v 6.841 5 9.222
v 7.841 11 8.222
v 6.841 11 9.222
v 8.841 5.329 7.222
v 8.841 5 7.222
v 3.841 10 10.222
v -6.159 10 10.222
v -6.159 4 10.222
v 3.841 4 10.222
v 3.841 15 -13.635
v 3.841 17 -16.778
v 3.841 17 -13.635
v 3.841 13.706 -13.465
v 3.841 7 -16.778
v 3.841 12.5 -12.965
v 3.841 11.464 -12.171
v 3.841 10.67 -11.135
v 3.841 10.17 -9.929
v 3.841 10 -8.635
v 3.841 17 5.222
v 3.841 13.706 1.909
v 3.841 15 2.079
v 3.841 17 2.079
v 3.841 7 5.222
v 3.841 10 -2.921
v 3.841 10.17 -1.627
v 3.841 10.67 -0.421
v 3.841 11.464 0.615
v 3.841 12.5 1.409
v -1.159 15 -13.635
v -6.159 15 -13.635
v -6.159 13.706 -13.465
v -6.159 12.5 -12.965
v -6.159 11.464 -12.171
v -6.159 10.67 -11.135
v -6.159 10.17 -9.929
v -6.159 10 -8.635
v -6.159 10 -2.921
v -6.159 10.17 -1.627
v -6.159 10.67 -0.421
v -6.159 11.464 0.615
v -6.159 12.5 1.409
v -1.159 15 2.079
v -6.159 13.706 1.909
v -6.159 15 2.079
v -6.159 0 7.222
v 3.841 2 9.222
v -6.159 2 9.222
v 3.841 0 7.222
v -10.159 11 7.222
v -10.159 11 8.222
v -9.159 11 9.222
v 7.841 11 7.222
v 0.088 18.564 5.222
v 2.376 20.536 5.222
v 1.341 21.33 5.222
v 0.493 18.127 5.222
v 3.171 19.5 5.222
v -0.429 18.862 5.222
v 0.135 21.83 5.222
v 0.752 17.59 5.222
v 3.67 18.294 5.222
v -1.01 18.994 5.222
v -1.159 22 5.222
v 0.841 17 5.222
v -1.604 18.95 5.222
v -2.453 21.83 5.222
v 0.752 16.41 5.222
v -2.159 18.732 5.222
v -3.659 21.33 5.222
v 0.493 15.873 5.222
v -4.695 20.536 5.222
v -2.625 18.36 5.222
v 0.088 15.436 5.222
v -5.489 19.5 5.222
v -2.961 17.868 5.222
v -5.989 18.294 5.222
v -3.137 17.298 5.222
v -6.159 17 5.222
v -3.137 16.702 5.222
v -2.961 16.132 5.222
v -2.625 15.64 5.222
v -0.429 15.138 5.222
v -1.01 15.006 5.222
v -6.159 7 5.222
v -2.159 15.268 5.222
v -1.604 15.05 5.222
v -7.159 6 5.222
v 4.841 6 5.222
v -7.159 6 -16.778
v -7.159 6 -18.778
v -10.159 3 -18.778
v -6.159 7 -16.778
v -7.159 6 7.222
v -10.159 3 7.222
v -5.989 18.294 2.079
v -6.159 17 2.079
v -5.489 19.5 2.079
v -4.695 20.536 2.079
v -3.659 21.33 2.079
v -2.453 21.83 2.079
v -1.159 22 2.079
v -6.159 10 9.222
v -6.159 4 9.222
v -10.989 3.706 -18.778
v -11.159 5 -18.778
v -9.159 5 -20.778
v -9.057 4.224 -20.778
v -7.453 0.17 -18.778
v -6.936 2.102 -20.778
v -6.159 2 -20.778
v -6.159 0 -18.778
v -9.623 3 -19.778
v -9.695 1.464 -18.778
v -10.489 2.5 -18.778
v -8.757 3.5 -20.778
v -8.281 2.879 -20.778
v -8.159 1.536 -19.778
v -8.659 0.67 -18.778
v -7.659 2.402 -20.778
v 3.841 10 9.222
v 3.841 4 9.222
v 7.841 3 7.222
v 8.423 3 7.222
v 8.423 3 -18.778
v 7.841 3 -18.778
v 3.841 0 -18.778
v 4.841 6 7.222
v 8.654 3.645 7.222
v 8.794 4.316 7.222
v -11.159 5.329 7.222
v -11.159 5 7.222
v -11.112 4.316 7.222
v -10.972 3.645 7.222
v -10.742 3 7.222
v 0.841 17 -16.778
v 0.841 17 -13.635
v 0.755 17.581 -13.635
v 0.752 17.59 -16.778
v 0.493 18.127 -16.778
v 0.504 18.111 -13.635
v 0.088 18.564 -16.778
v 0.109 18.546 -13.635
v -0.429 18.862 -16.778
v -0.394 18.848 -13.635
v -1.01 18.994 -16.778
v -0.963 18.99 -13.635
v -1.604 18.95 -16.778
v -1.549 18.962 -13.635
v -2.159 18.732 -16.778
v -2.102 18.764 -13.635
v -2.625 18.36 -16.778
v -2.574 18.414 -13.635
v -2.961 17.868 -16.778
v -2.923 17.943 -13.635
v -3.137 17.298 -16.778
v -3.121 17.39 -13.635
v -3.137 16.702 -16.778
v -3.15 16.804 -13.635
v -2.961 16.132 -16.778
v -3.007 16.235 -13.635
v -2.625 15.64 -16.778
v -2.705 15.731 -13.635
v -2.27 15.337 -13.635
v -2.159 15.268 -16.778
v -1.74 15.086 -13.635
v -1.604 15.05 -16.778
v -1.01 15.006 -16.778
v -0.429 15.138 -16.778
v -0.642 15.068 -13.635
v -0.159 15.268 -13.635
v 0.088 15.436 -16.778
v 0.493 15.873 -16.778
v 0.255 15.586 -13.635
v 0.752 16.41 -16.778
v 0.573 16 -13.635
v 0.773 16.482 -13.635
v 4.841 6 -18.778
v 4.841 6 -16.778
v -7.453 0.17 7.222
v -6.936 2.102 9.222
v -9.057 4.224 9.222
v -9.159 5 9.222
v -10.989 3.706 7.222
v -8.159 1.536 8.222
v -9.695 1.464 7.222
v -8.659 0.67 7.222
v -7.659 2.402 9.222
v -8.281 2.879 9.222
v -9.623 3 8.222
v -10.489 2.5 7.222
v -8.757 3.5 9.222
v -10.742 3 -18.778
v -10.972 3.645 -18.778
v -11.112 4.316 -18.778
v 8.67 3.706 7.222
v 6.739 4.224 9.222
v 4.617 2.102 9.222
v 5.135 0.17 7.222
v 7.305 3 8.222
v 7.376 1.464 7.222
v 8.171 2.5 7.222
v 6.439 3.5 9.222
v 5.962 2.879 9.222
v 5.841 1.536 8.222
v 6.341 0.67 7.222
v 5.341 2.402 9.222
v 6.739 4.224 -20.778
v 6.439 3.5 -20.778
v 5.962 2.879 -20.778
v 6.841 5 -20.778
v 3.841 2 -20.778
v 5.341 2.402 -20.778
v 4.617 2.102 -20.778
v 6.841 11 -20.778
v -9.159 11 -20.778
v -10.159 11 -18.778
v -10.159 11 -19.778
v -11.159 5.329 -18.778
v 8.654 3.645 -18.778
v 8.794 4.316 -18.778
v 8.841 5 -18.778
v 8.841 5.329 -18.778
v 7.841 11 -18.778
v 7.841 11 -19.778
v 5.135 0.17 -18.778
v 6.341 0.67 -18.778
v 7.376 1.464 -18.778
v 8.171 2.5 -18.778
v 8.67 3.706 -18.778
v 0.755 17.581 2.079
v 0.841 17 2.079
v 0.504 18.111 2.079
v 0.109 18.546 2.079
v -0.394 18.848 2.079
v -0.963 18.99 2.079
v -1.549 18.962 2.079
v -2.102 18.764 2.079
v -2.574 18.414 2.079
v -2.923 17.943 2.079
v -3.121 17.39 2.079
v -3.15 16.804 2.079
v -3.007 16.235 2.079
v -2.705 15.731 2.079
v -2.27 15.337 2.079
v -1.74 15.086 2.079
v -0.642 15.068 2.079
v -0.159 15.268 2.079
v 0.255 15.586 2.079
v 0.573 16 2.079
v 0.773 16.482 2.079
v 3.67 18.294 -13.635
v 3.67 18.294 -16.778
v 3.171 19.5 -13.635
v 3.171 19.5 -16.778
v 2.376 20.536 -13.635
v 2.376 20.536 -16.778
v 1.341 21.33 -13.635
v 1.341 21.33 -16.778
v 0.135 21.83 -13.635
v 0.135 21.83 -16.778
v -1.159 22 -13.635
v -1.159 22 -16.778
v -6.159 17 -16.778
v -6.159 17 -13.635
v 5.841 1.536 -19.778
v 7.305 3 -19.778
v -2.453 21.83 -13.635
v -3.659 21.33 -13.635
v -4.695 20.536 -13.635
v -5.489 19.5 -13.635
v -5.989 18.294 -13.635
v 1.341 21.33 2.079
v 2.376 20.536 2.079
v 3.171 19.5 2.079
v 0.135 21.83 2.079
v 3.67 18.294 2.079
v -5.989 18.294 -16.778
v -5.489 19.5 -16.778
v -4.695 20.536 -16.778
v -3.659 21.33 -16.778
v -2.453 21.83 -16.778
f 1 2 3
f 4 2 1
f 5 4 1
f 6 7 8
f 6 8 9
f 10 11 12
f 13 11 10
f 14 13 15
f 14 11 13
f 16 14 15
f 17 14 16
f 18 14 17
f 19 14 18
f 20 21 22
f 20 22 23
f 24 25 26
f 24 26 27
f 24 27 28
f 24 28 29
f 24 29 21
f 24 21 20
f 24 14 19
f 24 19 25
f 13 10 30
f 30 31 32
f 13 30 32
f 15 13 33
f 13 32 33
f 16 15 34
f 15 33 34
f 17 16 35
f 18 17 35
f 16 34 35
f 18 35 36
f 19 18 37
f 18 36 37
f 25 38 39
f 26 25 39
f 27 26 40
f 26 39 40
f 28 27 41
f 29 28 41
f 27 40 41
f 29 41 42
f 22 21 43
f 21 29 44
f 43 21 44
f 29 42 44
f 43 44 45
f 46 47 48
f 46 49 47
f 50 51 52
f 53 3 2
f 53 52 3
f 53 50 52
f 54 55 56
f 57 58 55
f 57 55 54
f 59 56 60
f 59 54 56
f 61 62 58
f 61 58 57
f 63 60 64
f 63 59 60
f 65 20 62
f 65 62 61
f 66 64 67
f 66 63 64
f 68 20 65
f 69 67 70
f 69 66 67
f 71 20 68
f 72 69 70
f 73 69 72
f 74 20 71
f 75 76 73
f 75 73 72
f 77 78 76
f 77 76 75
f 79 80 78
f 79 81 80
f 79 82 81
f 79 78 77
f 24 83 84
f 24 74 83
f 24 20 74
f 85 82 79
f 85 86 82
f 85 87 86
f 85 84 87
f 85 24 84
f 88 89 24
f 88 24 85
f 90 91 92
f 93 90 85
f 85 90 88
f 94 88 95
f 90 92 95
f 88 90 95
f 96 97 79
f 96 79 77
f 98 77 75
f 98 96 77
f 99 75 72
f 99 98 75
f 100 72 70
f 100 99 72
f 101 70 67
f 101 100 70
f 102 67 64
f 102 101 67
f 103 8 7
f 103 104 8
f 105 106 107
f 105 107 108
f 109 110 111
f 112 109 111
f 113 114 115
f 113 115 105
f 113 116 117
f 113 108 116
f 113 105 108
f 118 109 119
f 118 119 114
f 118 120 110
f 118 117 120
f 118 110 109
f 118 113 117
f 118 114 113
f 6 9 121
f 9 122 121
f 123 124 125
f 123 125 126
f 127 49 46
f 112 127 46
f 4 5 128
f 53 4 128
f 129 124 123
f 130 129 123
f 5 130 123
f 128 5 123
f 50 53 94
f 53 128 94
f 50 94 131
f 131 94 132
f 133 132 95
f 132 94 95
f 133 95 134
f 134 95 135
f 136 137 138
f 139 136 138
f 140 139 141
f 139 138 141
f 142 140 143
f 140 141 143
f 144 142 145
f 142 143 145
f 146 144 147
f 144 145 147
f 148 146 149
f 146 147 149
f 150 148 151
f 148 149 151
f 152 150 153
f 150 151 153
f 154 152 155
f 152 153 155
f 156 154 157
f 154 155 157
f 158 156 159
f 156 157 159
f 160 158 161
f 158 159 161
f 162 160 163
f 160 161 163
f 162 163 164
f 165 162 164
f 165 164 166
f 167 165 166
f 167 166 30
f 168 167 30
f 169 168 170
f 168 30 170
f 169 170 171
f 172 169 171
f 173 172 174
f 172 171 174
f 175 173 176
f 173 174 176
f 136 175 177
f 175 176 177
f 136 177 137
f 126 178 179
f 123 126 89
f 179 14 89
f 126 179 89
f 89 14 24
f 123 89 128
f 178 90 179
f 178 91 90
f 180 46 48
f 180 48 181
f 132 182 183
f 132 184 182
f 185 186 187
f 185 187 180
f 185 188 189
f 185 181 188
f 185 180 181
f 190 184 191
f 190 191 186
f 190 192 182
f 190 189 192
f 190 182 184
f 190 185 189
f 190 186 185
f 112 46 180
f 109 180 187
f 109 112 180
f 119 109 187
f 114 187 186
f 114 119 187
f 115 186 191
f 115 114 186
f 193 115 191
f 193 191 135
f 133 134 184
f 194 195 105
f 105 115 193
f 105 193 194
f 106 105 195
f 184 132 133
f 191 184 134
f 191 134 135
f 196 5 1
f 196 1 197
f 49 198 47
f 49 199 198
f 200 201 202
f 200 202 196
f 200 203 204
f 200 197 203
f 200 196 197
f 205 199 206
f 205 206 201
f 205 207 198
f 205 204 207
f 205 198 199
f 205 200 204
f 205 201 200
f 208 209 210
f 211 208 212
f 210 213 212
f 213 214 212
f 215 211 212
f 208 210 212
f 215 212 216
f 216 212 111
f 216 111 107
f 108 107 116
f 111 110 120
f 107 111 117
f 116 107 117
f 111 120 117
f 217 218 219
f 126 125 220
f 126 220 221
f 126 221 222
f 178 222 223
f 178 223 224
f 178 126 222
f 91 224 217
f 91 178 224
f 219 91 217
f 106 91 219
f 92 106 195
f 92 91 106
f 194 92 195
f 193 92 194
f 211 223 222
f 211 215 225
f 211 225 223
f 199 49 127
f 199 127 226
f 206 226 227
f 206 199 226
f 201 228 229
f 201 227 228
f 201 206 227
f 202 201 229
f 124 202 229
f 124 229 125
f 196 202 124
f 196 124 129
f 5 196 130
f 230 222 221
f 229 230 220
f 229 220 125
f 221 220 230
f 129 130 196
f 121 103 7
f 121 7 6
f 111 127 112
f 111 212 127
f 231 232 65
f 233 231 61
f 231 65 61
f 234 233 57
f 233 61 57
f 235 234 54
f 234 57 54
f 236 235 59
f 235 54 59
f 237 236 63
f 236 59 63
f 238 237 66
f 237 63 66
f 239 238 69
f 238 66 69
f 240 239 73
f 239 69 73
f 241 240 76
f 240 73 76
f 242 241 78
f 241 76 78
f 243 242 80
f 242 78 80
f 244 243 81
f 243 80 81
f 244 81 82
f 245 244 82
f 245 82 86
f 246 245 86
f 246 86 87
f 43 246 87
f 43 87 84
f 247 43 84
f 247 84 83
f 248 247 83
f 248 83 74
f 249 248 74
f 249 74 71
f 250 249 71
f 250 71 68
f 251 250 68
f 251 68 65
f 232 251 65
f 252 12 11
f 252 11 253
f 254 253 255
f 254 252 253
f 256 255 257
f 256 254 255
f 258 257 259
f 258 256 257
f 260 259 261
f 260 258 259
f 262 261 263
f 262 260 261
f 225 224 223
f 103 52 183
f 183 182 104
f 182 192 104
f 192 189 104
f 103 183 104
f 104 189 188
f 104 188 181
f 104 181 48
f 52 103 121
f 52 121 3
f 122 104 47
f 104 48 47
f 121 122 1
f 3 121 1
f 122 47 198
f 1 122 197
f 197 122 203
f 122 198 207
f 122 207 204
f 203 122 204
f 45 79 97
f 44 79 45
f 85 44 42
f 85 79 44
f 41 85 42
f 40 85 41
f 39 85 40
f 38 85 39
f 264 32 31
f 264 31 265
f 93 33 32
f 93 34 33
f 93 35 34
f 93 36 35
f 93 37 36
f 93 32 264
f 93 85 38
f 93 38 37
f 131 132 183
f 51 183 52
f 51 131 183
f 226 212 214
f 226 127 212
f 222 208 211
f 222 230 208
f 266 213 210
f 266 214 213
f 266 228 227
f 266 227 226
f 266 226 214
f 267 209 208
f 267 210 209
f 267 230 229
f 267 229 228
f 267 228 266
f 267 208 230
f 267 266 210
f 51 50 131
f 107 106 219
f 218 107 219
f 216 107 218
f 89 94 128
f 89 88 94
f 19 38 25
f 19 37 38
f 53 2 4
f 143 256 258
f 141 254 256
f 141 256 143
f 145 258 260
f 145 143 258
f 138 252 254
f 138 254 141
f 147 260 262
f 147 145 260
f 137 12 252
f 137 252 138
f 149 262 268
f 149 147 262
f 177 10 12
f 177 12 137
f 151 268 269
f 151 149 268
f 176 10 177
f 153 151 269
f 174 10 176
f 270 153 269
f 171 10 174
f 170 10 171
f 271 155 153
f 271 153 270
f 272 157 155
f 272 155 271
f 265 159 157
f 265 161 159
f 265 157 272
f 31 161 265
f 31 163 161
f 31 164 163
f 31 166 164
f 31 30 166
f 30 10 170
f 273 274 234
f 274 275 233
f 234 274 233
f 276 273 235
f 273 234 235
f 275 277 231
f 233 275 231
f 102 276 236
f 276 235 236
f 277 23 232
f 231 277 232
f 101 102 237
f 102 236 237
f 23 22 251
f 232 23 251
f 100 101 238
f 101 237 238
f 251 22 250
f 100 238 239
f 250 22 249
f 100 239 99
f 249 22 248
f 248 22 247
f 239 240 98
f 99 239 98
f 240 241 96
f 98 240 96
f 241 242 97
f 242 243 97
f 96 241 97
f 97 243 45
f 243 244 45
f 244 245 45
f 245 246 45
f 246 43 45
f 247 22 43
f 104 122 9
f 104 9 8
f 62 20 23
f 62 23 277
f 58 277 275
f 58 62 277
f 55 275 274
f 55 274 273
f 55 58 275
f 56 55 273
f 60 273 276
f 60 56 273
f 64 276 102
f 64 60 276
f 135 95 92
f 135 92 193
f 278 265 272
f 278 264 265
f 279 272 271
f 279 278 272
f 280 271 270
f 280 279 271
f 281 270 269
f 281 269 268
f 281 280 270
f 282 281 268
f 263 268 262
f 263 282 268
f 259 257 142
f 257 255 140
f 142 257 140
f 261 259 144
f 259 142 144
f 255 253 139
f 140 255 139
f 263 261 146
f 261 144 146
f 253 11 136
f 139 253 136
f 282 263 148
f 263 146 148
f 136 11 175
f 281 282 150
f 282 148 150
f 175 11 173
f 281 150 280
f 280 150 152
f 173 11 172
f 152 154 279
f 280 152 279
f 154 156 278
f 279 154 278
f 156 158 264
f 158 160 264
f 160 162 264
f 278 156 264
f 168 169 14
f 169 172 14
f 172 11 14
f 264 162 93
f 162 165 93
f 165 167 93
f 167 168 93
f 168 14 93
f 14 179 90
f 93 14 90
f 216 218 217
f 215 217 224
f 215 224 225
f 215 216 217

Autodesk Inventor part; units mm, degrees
ref_plane "YZ Plane" through (0, 0, 0) normal (1, 0, 0) x (0, 1, 0)
ref_plane "XZ Plane" through (0, 0, 0) normal (0, 1, 0) x (-1, 0, 0)
sketch "Sketch2" plane through (0, 0, 0) normal (0, 1, 0) x (-1, 0, 0)
  line L0 (11.1593, 9.222) -> (-8.8407, 9.222)
  line L1 (-8.8407, 9.222) -> (-8.8407, -20.778)
  line L2 (-8.8407, -20.778) -> (11.1593, -20.778)
  line L3 (11.1593, -20.778) -> (11.1593, 9.222)
  point P0 (0, 0)
  dimension "d23" = 30
  dimension "d24" = 20
extrude "Extrusion2" add sketch "Sketch2" along normal blind 3
sketch "Sketch3" plane through (0, 3, 0) normal (0, 1, 0) x (1, 0, 0)
  line L0 (8.8407, -9.222) -> (8.8407, 20.778) projected
  line L1 (8.8407, 20.778) -> (-11.1593, 20.778) projected
  line L2 (-11.1593, 20.778) -> (-11.1593, -9.222) projected
  line L3 (-11.1593, -9.222) -> (8.8407, -9.222) projected
  line L4 (8.8407, -9.222) -> (8.8407, 20.778) projected
  line L5 (8.8407, 5.778) -> (-11.1593, 5.778)
  line L6 (-11.1593, 20.778) -> (-11.1593, -9.222) projected
  line L7 (8.8407, -7.222) -> (-11.1593, -7.222)
  line L8 (3.8407, -7.222) -> (-6.1593, -7.222)
  line L9 (-6.1593, -7.222) -> (-6.1593, 5.778)
  line L10 (-6.1593, 5.778) -> (3.8407, 5.778)
  line L11 (3.8407, 5.778) -> (3.8407, -7.222)
  line L12 (8.8407, 20.778) -> (8.8407, -9.222)
  line L13 (-11.1593, -9.222) -> (-11.1593, 20.778)
  line L14 (-11.1593, 20.778) -> (8.8407, 20.778)
  line L15 (8.8407, 20.778) -> (8.8407, -9.222)
  line L16 (-11.1593, -9.222) -> (-11.1593, 20.778)
  line L17 (8.8407, 18.778) -> (-11.1593, 18.778)
  line L18 (3.8407, 18.778) -> (-6.1593, 18.778)
  line L19 (-6.1593, 18.778) -> (-6.1593, 5.778)
  line L20 (3.8407, 5.778) -> (3.8407, 18.778)
  point P0 (0, 0)
  point P1 (8.8407, 18.778)
  point P2 (-11.1593, 18.778)
  point P3 (-6.1593, 18.778)
  point P4 (-6.1593, -7.222)
  dimension "d27" = 2
  dimension "d28" = 10
  dimension "d29" = 5
  dimension "d53" = 20
extrude "Extrusion3" add sketch "Sketch3" along normal blind 3 contours L3 L2 L7 L0 | L7 L9 L5 L11 | L17 L2 L1 L0 | L5 L19 L17 L20
sketch "Sketch4" plane through (0, 6, 0) normal (0, 1, 0) x (1, 0, 0)
  line L0 (8.8407, -7.222) -> (3.8407, -7.222) projected
  line L1 (8.8407, -9.222) -> (8.8407, -7.222) projected
  line L2 (8.8407, -7.222) -> (3.8407, -7.222) projected
  line L3 (3.8407, -7.222) -> (3.8407, 18.778) projected
  line L4 (3.8407, 18.778) -> (8.8407, 18.778) projected
  line L5 (8.8407, 18.778) -> (8.8407, 20.778) projected
  line L6 (8.8407, 20.778) -> (-11.1593, 20.778) projected
  line L7 (-11.1593, 20.778) -> (-11.1593, 18.778) projected
  line L8 (-11.1593, 18.778) -> (-6.1593, 18.778) projected
  line L9 (-6.1593, 18.778) -> (-6.1593, -7.222) projected
  line L10 (-6.1593, -7.222) -> (-11.1593, -7.222) projected
  line L11 (-11.1593, -7.222) -> (-11.1593, -9.222) projected
  line L12 (-11.1593, -9.222) -> (8.8407, -9.222) projected
  line L13 (8.8407, -7.222) -> (-11.1593, -7.222)
  line L14 (8.8407, -9.222) -> (8.8407, 20.778) projected
  line L15 (-11.1593, 18.778) -> (-11.1593, -7.222) projected
  line L16 (-11.1593, 18.778) -> (8.8407, 18.778)
  point P0 (0, 0)
extrude "Extrusion4" add sketch "Sketch4" along normal blind 5 contours L1 L12 L11 L10 L13 L0 | L4 L16 L8 L7 L6 L5
ref_plane "Work Plane1" through (8.8407, 0, -5.778) normal (0, 0, -1) x (-1, 0, 0)
chamfer "Chamfer1" distance 1 angle 80 2 edges at (8.8407, 11, 8.222) (-11.1593, 11, 8.222) measured on face at (2.174, 11, 8.5554)
chamfer "Chamfer2" distance 1 angle 80 2 edges at (8.8407, 11, -19.778) (-11.1593, 11, -19.778) measured on face at (2.174, 11, -19.4446)
sketch "Sketch5" plane through (0, 6, 0) normal (0, 1, 0) x (1, 0, 0)
  line L0 (-6.1593, -7.222) -> (3.8407, -7.222) projected
  line L1 (3.8407, -7.222) -> (3.8407, 18.778) projected
  line L2 (3.8407, 18.778) -> (-6.1593, 18.778) projected
  line L3 (-6.1593, 18.778) -> (-6.1593, -7.222) projected
  line L4 (3.8407, -5.222) -> (-6.1593, -5.222)
  line L5 (-6.1593, 18.778) -> (-6.1593, -7.222) projected
  line L6 (-15.1593, 5.778) -> (12.8407, 5.778) projected
  line L7 (3.8407, 16.778) -> (-6.1593, 16.778)
  point P0 (0, 0)
  point P1 (3.8407, 16.778)
  point P2 (-6.1593, 16.778)
  dimension "d40" = 11
  dimension "d54" = 26
extrude "Extrusion5" add sketch "Sketch5" along normal blind 4 contours L3 L6 L1 L4 | L3 L7 L1 L6
sketch "Sketch6" plane through (0, 10, 0) normal (0, 1, 0) x (1, 0, 0)
  line L0 (-6.1593, -7.222) -> (-6.1593, 18.778) projected
  line L1 (3.8407, 18.778) -> (3.8407, -7.222) projected
  line L2 (3.8407, -5.222) -> (3.8407, -2.0792)
  line L3 (3.8407, -2.0792) -> (-6.1593, -2.0792)
  line L4 (-6.1593, -2.0792) -> (-6.1593, -5.222)
  line L5 (3.8407, 16.778) -> (-6.1593, 16.778) projected
  line L6 (-6.1593, -5.222) -> (3.8407, -5.222) projected
  line L7 (-6.1593, 5.778) -> (3.8407, 5.778)
  line L8 (3.8407, 13.6351) -> (-6.1593, 13.6351)
  point P0 (0, 0)
  point P1 (-6.1593, -2.0792)
  point P2 (-6.1593, 13.6351)
  point P3 (3.8407, 13.6351)
  dimension "d43" = 22
  dimension "d44" = 3.1429
extrude "Extrusion6" add sketch "Sketch6" along normal blind 12 contours L0 L3 L1 L6 | L0 L5 L1 L8
fillet "Fillet1" radius 5 4 edges at (3.8407, 22, 3.6506) (-6.1593, 22, 3.6506) (-6.1593, 22, -15.2065) (3.8407, 22, -15.2065)
fillet "Fillet2" radius 5 2 edges at (-11.1593, 0, -5.778) (8.8407, 0, -5.778)
fillet "Fillet3" radius 5 2 edges at (-1.1593, 10, -13.6351) (-1.1593, 10, 2.0792)
sketch "Sketch9" plane through (-10.1593, 11, 9.222) normal (0, 0, 1) x (1, 0, 0)
  line L0 (0, 0) -> (18, 0) projected
  line L1 (4, -5) -> (4, 6) projected
  line L2 (14, -5) -> (14, 6) projected
  line L3 (0, 0) -> (18, 0) projected
  line L4 (4, 0) -> (14, 0)
  line L5 (14, 0) -> (14, -7)
  line L6 (14, -7) -> (4, -7)
  line L7 (4, -7) -> (4, 0)
  line L8 (4, -1) -> (14, -1)
  point P0 (10.1593, -11)
  point P1 (14, -1)
  point P2 (4, -1)
  dimension "d58" = 6
  dimension "d59" = 1
  dimension "d62" = 10
extrude "Extrusion8" add sketch "Sketch9" along normal blind 1 contours L8 L2 L5 L6 L7 L1
sketch "Sketch10" plane through (-6.1593, 6, 5.222) normal (0, 0, 1) x (1, 0, 0)
  circle A0 centre (5, 11) radius 2
  arc A1 (10, 11) -> (0, 11) centre (5, 11) ccw projected
  point P0 (6.1593, -6)
  dimension "d63" = 4
extrude "Extrusion9" cut sketch "Sketch10" against normal through all
chamfer "Chamfer3" distance 2 angle 45 10 edges at (-1.1593, 0, 9.222) (7.3762, 1.4645, 9.222) (8.8407, 5.1644, 9.222) (-9.6948, 1.4645, 9.222) (-11.1593, 5.1644, 9.222) (-1.1593, 0, -20.778) (-9.6948, 1.4645, -20.778) (-11.1593, 5.1644, -20.778) (7.3762, 1.4645, -20.778) (8.8407, 5.1644, -20.778)
chamfer "Chamfer4" distance 4 angle 45 2 edges at (-6.1593, 3, -5.778) (3.8407, 3, -5.778)
equation "\"d27\" = 0.1 * d53"
equation "\"d28\" = 0.5 * d53"
equation "\"d29\" = 0.25 * d53"
equation "\"d44\" = 0.142857 * d43"
properties part number "uchytka_spojky_medzi_velkym_strednym"
